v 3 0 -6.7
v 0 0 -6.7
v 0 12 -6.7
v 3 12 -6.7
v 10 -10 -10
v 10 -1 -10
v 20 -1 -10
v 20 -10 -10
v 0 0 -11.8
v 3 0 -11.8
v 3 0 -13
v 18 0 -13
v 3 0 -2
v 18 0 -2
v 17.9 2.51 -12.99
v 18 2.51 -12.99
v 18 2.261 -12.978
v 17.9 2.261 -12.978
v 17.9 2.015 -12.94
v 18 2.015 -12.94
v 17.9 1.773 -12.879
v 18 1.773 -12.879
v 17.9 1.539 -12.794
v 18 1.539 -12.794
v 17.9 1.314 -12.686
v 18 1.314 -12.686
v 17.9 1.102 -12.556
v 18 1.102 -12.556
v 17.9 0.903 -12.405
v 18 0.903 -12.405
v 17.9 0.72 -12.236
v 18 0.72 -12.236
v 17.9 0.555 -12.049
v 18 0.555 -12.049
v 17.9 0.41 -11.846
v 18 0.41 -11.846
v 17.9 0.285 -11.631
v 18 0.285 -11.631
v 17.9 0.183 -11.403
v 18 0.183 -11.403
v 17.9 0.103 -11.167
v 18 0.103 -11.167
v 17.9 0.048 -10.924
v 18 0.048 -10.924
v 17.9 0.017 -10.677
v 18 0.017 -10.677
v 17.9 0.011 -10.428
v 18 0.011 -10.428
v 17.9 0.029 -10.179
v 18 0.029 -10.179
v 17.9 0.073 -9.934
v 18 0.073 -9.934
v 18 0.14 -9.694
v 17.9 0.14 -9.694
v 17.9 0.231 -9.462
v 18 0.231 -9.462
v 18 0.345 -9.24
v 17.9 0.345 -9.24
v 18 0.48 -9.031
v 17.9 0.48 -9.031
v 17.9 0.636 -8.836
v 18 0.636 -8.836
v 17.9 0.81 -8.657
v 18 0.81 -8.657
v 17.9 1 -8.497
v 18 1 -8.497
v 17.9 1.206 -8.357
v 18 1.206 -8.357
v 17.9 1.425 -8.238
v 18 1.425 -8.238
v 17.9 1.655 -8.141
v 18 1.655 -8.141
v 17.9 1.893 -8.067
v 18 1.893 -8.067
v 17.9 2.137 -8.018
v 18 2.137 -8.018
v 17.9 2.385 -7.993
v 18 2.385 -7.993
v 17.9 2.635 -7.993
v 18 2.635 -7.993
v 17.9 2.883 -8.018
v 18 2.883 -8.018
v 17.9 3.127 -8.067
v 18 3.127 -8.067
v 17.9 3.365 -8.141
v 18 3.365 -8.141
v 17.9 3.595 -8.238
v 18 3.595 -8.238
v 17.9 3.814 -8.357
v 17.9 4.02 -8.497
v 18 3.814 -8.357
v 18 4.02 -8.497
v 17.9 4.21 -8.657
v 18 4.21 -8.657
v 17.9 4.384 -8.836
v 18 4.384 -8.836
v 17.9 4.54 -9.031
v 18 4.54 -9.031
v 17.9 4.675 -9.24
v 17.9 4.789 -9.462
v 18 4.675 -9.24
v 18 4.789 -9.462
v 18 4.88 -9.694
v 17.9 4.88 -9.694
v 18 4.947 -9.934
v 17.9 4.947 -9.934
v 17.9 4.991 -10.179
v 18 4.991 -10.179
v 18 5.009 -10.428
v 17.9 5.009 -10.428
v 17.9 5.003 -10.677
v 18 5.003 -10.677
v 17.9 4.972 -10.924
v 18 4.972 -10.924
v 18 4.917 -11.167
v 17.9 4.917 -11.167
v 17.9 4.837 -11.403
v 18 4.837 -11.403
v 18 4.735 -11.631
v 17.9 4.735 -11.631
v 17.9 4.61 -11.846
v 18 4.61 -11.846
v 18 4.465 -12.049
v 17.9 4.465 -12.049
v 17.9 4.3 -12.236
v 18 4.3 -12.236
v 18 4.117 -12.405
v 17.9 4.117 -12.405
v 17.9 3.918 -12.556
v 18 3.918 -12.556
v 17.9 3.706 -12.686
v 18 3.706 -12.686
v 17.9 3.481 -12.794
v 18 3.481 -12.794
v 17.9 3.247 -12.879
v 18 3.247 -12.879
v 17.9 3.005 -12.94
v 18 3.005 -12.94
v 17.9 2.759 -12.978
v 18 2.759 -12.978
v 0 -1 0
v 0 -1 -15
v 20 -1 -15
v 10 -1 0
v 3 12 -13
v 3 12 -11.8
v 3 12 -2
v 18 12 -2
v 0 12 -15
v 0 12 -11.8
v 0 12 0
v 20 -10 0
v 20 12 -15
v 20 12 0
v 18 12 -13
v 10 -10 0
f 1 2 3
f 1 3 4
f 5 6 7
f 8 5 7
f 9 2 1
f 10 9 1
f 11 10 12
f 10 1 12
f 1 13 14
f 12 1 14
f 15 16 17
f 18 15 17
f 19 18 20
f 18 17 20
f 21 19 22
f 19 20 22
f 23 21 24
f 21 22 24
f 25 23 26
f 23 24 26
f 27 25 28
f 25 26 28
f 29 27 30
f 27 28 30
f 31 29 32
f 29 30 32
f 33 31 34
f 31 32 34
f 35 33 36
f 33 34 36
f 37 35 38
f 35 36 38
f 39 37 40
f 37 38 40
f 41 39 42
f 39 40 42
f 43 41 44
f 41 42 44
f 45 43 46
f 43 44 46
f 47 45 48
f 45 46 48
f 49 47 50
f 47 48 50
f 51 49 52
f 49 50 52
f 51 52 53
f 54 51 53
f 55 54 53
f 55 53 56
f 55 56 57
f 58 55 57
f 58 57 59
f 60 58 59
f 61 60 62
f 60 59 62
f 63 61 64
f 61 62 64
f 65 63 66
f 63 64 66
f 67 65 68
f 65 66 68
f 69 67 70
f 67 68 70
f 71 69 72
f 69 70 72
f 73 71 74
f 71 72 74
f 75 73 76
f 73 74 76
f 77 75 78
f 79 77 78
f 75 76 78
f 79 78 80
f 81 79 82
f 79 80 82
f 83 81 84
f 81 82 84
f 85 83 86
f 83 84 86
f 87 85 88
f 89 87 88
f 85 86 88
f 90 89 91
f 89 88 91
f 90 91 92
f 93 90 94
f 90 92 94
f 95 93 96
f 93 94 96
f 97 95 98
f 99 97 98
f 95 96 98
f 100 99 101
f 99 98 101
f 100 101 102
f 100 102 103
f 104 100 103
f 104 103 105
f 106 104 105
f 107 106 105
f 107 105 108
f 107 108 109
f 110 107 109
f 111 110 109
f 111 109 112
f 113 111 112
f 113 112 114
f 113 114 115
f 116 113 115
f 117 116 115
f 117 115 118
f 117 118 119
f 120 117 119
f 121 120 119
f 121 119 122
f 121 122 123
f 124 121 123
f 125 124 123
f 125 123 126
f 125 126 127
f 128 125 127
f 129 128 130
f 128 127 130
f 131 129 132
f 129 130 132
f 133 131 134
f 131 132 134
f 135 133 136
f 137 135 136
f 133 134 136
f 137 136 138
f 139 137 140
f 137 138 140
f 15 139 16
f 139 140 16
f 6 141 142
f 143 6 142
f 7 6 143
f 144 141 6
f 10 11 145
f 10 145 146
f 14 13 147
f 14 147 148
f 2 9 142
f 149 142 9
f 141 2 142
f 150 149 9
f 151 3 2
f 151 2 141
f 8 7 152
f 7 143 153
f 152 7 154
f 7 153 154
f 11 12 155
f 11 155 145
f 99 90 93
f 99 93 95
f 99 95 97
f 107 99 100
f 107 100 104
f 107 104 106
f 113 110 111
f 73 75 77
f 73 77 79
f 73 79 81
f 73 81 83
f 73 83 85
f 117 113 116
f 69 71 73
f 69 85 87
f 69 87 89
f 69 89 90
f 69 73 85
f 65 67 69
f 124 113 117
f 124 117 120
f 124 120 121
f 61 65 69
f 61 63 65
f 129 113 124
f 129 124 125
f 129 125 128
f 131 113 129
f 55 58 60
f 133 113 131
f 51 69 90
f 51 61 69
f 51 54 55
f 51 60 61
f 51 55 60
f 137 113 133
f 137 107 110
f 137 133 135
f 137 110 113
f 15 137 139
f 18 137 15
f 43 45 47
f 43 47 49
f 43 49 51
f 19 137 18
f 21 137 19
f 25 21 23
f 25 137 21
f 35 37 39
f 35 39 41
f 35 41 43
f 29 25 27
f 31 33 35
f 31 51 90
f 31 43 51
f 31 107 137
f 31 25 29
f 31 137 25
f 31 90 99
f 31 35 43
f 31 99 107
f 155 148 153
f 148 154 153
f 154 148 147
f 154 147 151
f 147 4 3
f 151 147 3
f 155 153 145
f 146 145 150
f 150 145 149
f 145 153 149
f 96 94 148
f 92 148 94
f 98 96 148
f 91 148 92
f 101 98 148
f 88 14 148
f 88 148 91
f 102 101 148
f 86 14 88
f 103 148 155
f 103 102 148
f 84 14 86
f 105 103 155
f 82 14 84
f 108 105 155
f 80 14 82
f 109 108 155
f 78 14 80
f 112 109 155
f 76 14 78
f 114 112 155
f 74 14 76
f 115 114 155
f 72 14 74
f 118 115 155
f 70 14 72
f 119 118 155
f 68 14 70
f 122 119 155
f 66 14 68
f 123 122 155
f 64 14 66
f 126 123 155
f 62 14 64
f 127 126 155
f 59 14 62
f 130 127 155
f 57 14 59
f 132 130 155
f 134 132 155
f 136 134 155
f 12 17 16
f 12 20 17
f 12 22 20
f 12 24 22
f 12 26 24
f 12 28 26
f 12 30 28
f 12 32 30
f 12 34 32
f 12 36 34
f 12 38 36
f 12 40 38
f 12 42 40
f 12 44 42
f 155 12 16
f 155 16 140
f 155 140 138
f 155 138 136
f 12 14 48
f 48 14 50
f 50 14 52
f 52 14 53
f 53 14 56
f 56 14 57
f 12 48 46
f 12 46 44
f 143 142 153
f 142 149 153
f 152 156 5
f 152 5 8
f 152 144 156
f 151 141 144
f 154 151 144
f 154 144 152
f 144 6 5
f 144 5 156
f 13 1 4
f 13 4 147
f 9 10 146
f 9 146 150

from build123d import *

# Parameters (mm, degrees)
BOSS_EXTRUDE1_DEPTH = 12
SKETCH3_W           = 20
SKETCH3_H           = 15
BOSS_EXTRUDE2_DEPTH = 1
SKETCH4_W           = 10
SKETCH4_H           = 10
BOSS_EXTRUDE3_DEPTH = 9
SKETCH5_R           = 2.5
BOSS_EXTRUDE7_DEPTH = 0.1


with BuildPart() as part:
    # Sketch1 → Boss-Extrude1 (new body)
    with BuildSketch(Plane(origin=(0, 0, 0), x_dir=(1, 0, 0), z_dir=(0, 1, 0))):
        Polygon((3, 2), (18, 2), (18, 13), (3, 13), (3, 11.8), (0, 11.8), (0, 15), (20, 15), (20, 0), (0, 0), (0, 6.7), (3, 6.7), align=None)
    extrude(amount=BOSS_EXTRUDE1_DEPTH)

    # Sketch3 → Boss-Extrude2 (add)
    with BuildSketch(Plane.XZ):
        with Locations((10, -7.5)):
            Rectangle(SKETCH3_W, SKETCH3_H)
    extrude(amount=BOSS_EXTRUDE2_DEPTH)

    # Sketch4 → Boss-Extrude3 (add)
    with BuildSketch(Plane.XZ.offset(1)):
        with Locations((15, -5)):
            Rectangle(SKETCH4_W, SKETCH4_H)
    extrude(amount=BOSS_EXTRUDE3_DEPTH)

    # Sketch5 → Boss-Extrude7 (add)
    with BuildSketch(Plane.ZY.offset(-18)):
        with Locations(Location((-10.49, 2.51, 0), (0, 0, 180))):
            Circle(SKETCH5_R)
    extrude(amount=BOSS_EXTRUDE7_DEPTH)


solid = part.part
